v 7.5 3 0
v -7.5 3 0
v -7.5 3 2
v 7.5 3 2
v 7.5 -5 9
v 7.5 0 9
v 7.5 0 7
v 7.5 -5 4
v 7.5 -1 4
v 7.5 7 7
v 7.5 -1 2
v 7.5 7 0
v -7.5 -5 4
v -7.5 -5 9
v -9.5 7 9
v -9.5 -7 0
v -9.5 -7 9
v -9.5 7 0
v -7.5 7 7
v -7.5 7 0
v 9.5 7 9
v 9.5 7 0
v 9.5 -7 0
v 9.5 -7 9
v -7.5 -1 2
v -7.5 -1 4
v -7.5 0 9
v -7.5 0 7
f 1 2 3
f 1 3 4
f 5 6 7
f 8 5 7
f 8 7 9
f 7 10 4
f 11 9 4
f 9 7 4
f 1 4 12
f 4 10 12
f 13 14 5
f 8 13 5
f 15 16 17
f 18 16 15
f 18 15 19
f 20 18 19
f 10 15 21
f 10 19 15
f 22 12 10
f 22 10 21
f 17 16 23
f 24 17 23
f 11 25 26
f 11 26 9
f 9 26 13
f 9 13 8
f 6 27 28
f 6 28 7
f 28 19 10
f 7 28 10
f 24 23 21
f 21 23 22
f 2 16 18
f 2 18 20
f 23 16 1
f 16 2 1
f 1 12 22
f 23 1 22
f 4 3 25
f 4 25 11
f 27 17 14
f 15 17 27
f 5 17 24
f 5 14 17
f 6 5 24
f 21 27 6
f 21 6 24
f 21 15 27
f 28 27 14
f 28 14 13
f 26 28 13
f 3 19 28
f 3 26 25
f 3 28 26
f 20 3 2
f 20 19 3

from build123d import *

# Parameters (mm, degrees)
SKETCH2_W           = 19
SKETCH2_H           = 14
BOSS_EXTRUDE1_DEPTH = 9
SKETCH3_W           = 15
SKETCH3_H           = 5
CUT_EXTRUDE1_DEPTH  = 5
SKETCH6_W           = 15
SKETCH6_H           = 7
CUT_EXTRUDE3_DEPTH  = 4
SKETCH7_W           = 15
SKETCH7_H           = 5
CUT_EXTRUDE4_DEPTH  = 4


with BuildPart() as part:
    # Sketch2 → Boss-Extrude1 (new body)
    with BuildSketch(Plane.XY):
        Rectangle(SKETCH2_W, SKETCH2_H)
    extrude(amount=BOSS_EXTRUDE1_DEPTH)

    # Sketch3 → Cut-Extrude1 (cut)
    with BuildSketch(Plane.XY.offset(9)):
        with Locations((0, -2.5)):
            Rectangle(SKETCH3_W, SKETCH3_H)
    extrude(amount=-CUT_EXTRUDE1_DEPTH, mode=Mode.SUBTRACT)

    # Sketch6 → Cut-Extrude3 (cut)
    with BuildSketch(Plane(origin=(0, 7, 0), x_dir=(1, 0, 0), z_dir=(0, 1, 0))):
        with Locations((0, -3.5)):
            Rectangle(SKETCH6_W, SKETCH6_H)
    extrude(amount=-CUT_EXTRUDE3_DEPTH, mode=Mode.SUBTRACT)

    # Sketch7 → Cut-Extrude4 (cut)
    with BuildSketch(Plane(origin=(0, 3, 0), x_dir=(1, 0, 0), z_dir=(0, 1, 0))):
        with Locations((0, -4.5)):
            Rectangle(SKETCH7_W, SKETCH7_H)
    extrude(amount=-CUT_EXTRUDE4_DEPTH, mode=Mode.SUBTRACT)


solid = part.part
